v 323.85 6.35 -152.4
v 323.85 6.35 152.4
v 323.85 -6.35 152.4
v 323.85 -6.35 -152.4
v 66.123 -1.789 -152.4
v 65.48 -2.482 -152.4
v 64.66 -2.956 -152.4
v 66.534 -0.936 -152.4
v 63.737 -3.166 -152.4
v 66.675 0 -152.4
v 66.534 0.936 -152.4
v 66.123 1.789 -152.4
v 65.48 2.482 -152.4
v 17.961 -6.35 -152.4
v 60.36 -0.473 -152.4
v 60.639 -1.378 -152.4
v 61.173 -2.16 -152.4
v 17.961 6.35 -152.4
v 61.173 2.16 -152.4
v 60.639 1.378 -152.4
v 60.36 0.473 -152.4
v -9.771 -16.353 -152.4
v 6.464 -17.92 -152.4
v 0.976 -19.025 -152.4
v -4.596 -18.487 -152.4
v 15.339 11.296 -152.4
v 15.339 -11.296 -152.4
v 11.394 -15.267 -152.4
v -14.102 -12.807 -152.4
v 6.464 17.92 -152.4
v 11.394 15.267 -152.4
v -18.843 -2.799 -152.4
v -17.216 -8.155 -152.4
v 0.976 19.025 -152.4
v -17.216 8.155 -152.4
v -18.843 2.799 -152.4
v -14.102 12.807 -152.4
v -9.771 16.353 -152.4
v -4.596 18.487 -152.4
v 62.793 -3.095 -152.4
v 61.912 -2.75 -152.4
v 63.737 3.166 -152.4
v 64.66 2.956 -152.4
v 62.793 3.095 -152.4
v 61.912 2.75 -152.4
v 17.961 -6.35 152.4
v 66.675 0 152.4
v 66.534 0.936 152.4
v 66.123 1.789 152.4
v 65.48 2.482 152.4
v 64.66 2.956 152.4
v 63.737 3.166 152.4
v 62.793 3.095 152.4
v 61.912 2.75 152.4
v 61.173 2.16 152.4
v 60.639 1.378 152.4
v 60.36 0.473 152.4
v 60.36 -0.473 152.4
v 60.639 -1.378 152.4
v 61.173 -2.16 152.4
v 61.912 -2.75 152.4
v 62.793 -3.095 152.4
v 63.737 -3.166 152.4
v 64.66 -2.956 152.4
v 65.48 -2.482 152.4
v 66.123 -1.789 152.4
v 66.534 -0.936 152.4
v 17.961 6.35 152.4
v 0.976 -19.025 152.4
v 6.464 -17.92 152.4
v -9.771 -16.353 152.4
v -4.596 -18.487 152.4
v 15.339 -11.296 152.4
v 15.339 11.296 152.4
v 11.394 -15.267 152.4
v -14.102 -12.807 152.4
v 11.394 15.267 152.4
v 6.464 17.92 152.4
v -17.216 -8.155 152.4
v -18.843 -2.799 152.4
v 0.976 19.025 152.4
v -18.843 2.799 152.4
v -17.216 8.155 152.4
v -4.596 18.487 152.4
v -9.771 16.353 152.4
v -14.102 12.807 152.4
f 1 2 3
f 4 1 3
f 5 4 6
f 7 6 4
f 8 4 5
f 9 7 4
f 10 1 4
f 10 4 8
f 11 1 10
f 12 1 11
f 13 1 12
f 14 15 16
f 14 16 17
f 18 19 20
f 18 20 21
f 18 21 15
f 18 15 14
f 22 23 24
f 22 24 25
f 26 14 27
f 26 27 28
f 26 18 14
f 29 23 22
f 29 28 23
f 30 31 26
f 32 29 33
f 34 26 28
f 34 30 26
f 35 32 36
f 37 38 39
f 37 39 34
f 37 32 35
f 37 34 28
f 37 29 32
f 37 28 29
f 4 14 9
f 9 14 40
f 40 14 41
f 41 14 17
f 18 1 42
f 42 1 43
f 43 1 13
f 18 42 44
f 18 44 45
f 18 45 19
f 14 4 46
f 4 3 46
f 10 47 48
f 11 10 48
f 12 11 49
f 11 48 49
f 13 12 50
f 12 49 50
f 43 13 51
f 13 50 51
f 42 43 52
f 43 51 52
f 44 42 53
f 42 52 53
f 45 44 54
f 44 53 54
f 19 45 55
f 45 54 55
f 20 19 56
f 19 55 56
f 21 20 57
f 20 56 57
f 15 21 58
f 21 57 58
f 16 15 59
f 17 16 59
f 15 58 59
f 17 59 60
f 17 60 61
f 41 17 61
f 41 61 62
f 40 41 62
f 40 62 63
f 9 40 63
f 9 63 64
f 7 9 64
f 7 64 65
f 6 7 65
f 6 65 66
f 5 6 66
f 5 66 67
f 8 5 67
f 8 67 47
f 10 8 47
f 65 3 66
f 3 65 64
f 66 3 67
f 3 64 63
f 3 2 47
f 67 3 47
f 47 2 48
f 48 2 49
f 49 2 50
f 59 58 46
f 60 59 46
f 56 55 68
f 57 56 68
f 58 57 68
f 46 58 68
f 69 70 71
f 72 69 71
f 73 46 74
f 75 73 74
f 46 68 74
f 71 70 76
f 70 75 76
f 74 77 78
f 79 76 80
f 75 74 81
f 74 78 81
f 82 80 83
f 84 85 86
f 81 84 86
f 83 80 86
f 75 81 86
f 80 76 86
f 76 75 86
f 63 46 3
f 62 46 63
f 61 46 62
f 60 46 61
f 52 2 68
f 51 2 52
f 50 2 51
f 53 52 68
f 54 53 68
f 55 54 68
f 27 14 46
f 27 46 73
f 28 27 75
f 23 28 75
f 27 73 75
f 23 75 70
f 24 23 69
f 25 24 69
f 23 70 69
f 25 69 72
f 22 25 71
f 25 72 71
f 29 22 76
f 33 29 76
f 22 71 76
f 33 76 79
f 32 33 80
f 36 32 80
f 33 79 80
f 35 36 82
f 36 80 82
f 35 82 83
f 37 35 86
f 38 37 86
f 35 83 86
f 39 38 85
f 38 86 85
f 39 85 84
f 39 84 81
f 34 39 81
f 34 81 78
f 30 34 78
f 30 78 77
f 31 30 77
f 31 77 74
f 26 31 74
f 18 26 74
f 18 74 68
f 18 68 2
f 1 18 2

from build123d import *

# Parameters (mm, degrees)
EXTRUDE1_DEPTH     = 152.4
SKETCH2_R          = 3.175
CUT_EXTRUDE1_DEPTH = 446.134547075


with BuildPart() as part:
    # Sketch1 → Extrude1 (new, symmetric)
    with BuildSketch(Plane.XY):
        with BuildLine():
            Line((323.85, 6.35), (323.85, -6.35))
            Line((323.85, -6.35), (17.960512242, -6.35))
            ThreePointArc((17.960512242, -6.35), (-19.05, 0), (17.960512242, 6.35))
            Line((17.960512242, 6.35), (323.85, 6.35))
        make_face()
    extrude(amount=EXTRUDE1_DEPTH, both=True)

    # Sketch2 → Cut-Extrude1 (cut, through all)
    with BuildSketch(Plane.XY.offset(152.4)):
        with Locations((63.5, 0)):
            Circle(SKETCH2_R)
    extrude(amount=-CUT_EXTRUDE1_DEPTH, mode=Mode.SUBTRACT)


solid = part.part
